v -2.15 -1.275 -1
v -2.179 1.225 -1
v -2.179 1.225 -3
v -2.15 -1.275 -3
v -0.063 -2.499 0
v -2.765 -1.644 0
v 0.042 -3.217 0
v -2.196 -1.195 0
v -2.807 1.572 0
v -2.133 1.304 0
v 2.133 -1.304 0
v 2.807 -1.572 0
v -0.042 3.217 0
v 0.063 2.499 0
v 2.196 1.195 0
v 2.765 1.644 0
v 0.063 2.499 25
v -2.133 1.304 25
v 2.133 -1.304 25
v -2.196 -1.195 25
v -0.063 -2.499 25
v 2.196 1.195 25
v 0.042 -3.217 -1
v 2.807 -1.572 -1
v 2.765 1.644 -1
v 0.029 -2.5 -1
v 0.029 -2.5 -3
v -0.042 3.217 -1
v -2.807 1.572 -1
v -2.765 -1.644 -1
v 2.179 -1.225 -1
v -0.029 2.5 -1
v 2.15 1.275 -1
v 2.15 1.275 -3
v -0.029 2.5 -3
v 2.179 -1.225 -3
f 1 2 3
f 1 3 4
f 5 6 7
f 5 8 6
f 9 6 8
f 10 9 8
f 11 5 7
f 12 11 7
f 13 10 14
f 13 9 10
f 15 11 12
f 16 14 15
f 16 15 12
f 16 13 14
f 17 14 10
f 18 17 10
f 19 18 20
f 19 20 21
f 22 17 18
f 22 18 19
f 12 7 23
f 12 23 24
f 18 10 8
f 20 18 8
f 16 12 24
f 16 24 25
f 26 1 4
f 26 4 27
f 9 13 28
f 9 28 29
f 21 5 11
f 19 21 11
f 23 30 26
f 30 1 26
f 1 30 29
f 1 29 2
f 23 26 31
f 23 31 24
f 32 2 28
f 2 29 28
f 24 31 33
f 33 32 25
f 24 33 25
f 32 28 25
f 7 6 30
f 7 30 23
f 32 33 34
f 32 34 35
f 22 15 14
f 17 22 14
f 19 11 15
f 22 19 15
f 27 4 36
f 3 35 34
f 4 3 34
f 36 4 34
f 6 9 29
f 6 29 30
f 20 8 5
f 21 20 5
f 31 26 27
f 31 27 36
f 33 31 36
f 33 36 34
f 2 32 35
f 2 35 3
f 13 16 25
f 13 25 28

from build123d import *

# Parameters (mm, degrees)
BOSS_EXTRUDE1_DEPTH = 25
BOSS_EXTRUDE2_DEPTH = 1
BOSS_EXTRUDE3_DEPTH = 3


with BuildPart() as part:
    # Sketch2 → Boss-Extrude1 (new body)
    with BuildSketch(Plane.XY):
        Polygon((2.132692592, -1.304462459), (2.196043924, 1.194734734), (0.063351332, 2.499197193), (-2.132692592, 1.304462459), (-2.196043924, -1.194734734), (-0.063351332, -2.499197193), align=None)
    extrude(amount=BOSS_EXTRUDE1_DEPTH)

    # Sketch3 → Boss-Extrude2 (add)
    with BuildSketch(Plane.XY):
        Polygon((2.806699615, -1.572449101), (2.765130676, 1.644448617), (-0.04156894, 3.216897718), (-2.806699615, 1.572449101), (-2.765130676, -1.644448617), (0.04156894, -3.216897718), align=None)
    extrude(amount=-BOSS_EXTRUDE2_DEPTH)

    # Sketch4 → Boss-Extrude3 (add)
    with BuildSketch(Plane.XY):
        Polygon((-2.150386975, -1.275082687), (0.029060512, -2.499831092), (2.179447487, -1.224748404), (2.150386975, 1.275082687), (-0.029060512, 2.499831092), (-2.179447487, 1.224748404), align=None)
    extrude(amount=-BOSS_EXTRUDE3_DEPTH)


solid = part.part
